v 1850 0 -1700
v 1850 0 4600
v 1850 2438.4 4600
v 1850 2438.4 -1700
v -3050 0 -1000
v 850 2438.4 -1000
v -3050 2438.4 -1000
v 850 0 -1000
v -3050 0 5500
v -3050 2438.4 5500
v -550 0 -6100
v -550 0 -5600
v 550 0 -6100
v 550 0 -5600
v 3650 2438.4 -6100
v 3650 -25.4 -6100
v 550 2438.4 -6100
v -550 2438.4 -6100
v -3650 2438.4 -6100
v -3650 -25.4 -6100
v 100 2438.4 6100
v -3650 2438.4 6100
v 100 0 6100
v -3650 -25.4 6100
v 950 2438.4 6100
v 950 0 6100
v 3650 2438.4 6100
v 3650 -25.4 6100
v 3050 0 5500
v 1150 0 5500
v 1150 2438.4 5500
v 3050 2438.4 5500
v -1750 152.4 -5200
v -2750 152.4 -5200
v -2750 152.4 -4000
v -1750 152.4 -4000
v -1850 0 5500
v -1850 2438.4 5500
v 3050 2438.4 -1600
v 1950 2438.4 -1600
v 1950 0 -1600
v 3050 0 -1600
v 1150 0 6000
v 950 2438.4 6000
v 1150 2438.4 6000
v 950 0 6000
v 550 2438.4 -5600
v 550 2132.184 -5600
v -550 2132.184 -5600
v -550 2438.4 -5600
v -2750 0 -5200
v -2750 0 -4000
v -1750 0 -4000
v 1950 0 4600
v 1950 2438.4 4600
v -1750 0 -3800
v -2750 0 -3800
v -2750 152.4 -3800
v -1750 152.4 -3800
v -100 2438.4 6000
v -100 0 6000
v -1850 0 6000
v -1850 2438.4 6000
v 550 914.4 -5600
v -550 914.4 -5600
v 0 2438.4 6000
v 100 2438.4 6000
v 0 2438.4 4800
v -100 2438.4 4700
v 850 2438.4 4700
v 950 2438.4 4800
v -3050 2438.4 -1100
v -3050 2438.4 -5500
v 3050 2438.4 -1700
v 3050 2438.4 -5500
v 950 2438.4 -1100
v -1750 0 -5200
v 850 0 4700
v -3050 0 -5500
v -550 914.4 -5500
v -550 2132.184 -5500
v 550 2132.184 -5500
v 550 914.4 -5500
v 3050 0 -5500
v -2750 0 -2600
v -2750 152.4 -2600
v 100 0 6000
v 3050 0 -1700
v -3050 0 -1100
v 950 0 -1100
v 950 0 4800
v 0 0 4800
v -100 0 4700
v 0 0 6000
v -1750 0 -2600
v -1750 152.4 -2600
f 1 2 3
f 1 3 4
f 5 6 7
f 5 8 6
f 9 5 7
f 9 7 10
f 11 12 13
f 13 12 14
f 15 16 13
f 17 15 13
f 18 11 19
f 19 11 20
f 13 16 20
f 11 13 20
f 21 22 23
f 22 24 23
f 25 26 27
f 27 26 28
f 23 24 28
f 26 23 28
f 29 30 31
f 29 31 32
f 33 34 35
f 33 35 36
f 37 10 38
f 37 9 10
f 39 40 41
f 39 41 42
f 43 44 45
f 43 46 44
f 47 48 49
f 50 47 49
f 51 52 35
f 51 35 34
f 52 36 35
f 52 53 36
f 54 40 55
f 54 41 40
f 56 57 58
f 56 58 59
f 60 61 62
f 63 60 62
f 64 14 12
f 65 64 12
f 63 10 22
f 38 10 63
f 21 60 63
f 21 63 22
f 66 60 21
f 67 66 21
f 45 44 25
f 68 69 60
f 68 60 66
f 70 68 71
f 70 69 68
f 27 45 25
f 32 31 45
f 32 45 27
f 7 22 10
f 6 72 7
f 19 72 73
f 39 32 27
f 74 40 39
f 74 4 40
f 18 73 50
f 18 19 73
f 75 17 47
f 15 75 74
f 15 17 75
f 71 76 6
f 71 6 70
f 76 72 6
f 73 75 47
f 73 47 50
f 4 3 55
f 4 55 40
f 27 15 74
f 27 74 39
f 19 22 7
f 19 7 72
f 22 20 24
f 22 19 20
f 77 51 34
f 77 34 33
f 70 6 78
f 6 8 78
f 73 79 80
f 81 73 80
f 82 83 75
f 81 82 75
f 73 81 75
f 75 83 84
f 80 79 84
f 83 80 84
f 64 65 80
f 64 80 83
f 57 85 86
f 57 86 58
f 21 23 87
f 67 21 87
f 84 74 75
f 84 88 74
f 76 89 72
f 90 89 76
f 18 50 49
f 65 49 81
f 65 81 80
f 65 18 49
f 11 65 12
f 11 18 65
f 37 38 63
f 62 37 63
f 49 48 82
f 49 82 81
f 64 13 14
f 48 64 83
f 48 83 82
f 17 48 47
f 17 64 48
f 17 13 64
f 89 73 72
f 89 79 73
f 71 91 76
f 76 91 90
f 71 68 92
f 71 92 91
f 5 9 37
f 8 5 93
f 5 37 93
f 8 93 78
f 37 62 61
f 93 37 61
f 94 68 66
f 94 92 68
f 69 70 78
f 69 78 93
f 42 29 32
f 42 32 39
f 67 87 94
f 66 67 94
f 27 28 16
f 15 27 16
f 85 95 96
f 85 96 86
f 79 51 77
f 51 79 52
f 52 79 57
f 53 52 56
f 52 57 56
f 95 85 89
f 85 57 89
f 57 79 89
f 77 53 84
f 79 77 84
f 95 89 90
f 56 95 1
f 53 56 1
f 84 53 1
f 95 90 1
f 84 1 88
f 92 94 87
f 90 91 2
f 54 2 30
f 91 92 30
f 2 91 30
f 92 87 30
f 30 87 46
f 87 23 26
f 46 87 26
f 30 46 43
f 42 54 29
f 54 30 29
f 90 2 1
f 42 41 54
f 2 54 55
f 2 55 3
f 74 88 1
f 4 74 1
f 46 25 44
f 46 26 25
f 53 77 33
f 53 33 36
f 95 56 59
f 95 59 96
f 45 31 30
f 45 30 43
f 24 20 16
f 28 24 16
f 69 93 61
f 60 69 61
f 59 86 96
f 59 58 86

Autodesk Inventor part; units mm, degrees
ref_plane "YZ Plane" through (0, 0, 0) normal (1, 0, 0) x (0, 1, 0)
ref_plane "XZ Plane" through (0, 0, 0) normal (0, 1, 0) x (-1, 0, 0)
ref_plane "XY Plane" through (0, 0, 0) normal (0, 0, 1) x (1, 0, 0)
sketch "Sketch1" plane through (0, 0, 0) normal (0, 1, 0) x (-1, 0, 0)
  line L0 (-3650, 6100) -> (-3650, -6100)
  line L1 (3650, -6100) -> (3650, 6100)
  line L2 (-3050, 5500) -> (-3050, -5500)
  line L3 (3050, -5500) -> (3050, 5500)
  line L4 (5110, 0) -> (-5110, 0) projected
  line L5 (0, -8540) -> (0, 8540) projected
  line L6 (-1150, 5500) -> (-1150, 6100)
  line L7 (1850, 5500) -> (1850, 6100)
  line L8 (550, -6100) -> (550, -5500)
  line L9 (-550, -6100) -> (-550, -5500)
  line L10 (-3650, -6100) -> (-550, -6100)
  line L11 (550, -6100) -> (3650, -6100)
  line L12 (-3050, -5500) -> (-550, -5500)
  line L13 (550, -5500) -> (3050, -5500)
  line L14 (3650, 6100) -> (1850, 6100)
  line L15 (-1150, 6100) -> (-3650, 6100)
  line L16 (3050, 5500) -> (1850, 5500)
  line L17 (-1150, 5500) -> (-3050, 5500)
  line L18 (3050, -1100) -> (-950, -1100)
  line L19 (-950, -1100) -> (-950, -1000)
  line L20 (-850, -1000) -> (3050, -1000)
  line L21 (3050, -1000) -> (3050, -1100)
  line L22 (1850, 6100) -> (-100, 6100)
  line L23 (-100, 6100) -> (-100, 6000)
  line L24 (1850, 6000) -> (1850, 6100)
  line L25 (0, 6000) -> (0, 4800)
  line L26 (100, 4700) -> (100, 6000)
  line L27 (-100, 6000) -> (0, 6000)
  line L28 (100, 6000) -> (1850, 6000)
  line L29 (-1150, 6100) -> (-950, 6100)
  line L30 (-950, 6100) -> (-950, 6000)
  line L31 (-950, 6000) -> (-1150, 6000)
  line L32 (-1150, 6000) -> (-1150, 6100)
  line L33 (0, 4800) -> (-950, 4800)
  line L34 (-950, 4800) -> (-950, 4700)
  line L35 (-850, 4700) -> (100, 4700)
  line L36 (100, 4700) -> (100, 4700)
  line L37 (-950, -1100) -> (-850, -1100)
  line L38 (-850, -1000) -> (-850, 4700)
  line L39 (-850, 4800) -> (-950, 4800)
  line L40 (-950, 4800) -> (-950, -1100)
  line L41 (-3050, -1700) -> (-1850, -1700)
  line L42 (-1850, -1700) -> (-1850, -1600)
  line L43 (-1950, -1600) -> (-3050, -1600)
  line L44 (-3050, -1600) -> (-3050, -1700)
  line L45 (-1850, -1700) -> (-1950, -1700)
  line L46 (-1950, -1600) -> (-1950, 4600)
  line L47 (-1950, 4600) -> (-1850, 4600)
  line L48 (-1850, 4600) -> (-1850, -1700)
  point P0 (0, 0)
  dimension "d0" = 7300
  dimension "d2" = 6100
  dimension "d5" = 1900
  dimension "d6" = 3000
  dimension "d7" = 2500
  dimension "d8" = 2500
  dimension "d9" = 12200
  dimension "d10" = 11000
  dimension "d11" = 100
  dimension "d12" = 4000
  dimension "d16" = 100
  dimension "d17" = 100
  dimension "d18" = 100
  dimension "d19" = 200
  dimension "d20" = 100
  dimension "d22" = 1200
  dimension "d23" = 6500
  dimension "d24" = 100
  dimension "d25" = 100
  dimension "d26" = 1200
  dimension "d27" = 3800
  dimension "d28" = 100
  dimension "d29" = 6300
extrude "Extrusion1" add sketch "Sketch1" along normal blind 2438.4 contours L15 L6 L17 L2 L4 L0 | L40 L34 L33 L5 L35 L38 L4 | L4 L38 L20 L5 L18 L19 L40 | L4 L2 L12 L9 L10 L0 | L29 L30 L31 L6 | L43 L46 L4 L48 L42 L41 L2 | L46 L47 L48 L4 | L4 L1 L11 L8 L13 L3 | L3 L16 L7 L14 L1 L4 | L20 L3 L18 L5 | L5 L22 L7 L28 L26 L35 | L27 L23 L22 L5
sketch "Sketch2" plane through (0, 0, 0) normal (0, -1, 0) x (1, 0, 0)
  line L0 (-100, 6000) -> (-1850, 6000) projected
  line L1 (-100, 4700) -> (-100, 6000) projected
  line L2 (850, 4700) -> (-100, 4700) projected
  line L3 (850, -1000) -> (850, 4700) projected
  line L4 (-3050, -1000) -> (850, -1000) projected
  line L5 (-3050, 5500) -> (-3050, -1000) projected
  line L6 (-1850, 5500) -> (-3050, 5500) projected
  line L7 (-1850, 6000) -> (-1850, 5500) projected
  line L8 (-3650, 6100) -> (100, 6100) projected
  line L9 (-3650, -6100) -> (-3650, 6100) projected
  line L10 (-550, -6100) -> (-3650, -6100) projected
  line L11 (-550, -5500) -> (-550, -6100) projected
  line L12 (-3050, -5500) -> (-550, -5500) projected
  line L13 (-3050, -1100) -> (-3050, -5500) projected
  line L14 (950, -1100) -> (-3050, -1100) projected
  line L15 (950, 4800) -> (950, -1100) projected
  line L16 (0, 4800) -> (950, 4800) projected
  line L17 (0, 6000) -> (0, 4800) projected
  line L18 (100, 6000) -> (0, 6000) projected
  line L19 (100, 6100) -> (100, 6000) projected
  line L20 (-3650, 6100) -> (3650, 6100)
  line L21 (3650, 6100) -> (3650, -6100)
  line L22 (3650, -6100) -> (-3650, -6100)
  line L23 (-3650, -6100) -> (-3650, 6100)
  point P0 (0, 0)
extrude "Extrusion2" add sketch "Sketch2" along normal blind 25.4 contours L1 L2 L3 L4 L5 L6 L7 L0 | L8 L19 L18 L17 L16 L15 L14 L13 L12 L11 L10 L9 | L20 L21 L22 L11 L12 L13 L14 L15 L16 L17 L18 L19
sketch "Sketch6" plane through (0, 0, 0) normal (0, 1, 0) x (1, 0, 0)
  line L0 (550, 6100) -> (550, 5500) projected
  line L1 (-550, 5500) -> (550, 5500)
  line L2 (550, 5500) -> (550, 5600)
  line L3 (550, 5600) -> (-550, 5600)
  line L4 (-550, 5600) -> (-550, 5500)
  point P0 (0, 0)
  dimension "d102" = 100
extrude "Extrusion6" add sketch "Sketch6" along normal up to surface (2438.4 mm away)
sketch "Sketch7" plane through (550, 0, -5600) normal (0, 0, -1) x (-1, 0, 0)
  line L0 (0, 0) -> (0, 2438.4) projected
  line L1 (1100, 0) -> (0, 0) projected
  line L2 (1100, 2438.4) -> (1100, 0) projected
  line L3 (0, 2132.1838) -> (1100, 2132.1838)
  line L4 (1100, 2132.1838) -> (1100, 914.4)
  line L5 (1100, 914.4) -> (0, 914.4)
  line L6 (0, 914.4) -> (0, 2132.1838)
  point P0 (550, 0)
  dimension "d111" = 914.4
extrude "Extrusion7" cut sketch "Sketch7" against normal up to surface (100 mm away) contours L0 L3 L2 L5
sketch "Sketch4" plane through (0, 0, 0) normal (0, 1, 0) x (1, 0, 0)
  line L0 (-3050, 5500) -> (-550, 5500) projected
  line L1 (-3050, 1100) -> (-3050, 5500) projected
  line L2 (-2750, 5200) -> (-1750, 5200)
  line L3 (-1750, 5200) -> (-1750, 4000)
  line L4 (-1750, 4000) -> (-2750, 4000)
  line L5 (-2750, 4000) -> (-2750, 5200)
  line L6 (-2750, 3800) -> (-1750, 3800)
  line L7 (-1750, 3800) -> (-1750, 2600)
  line L8 (-1750, 2600) -> (-2750, 2600)
  line L9 (-2750, 2600) -> (-2750, 3800)
  point P0 (0, 0)
  dimension "d79" = 1000
  dimension "d80" = 1200
  dimension "d81" = 1200
  dimension "d82" = 200
  dimension "d83" = 300
  dimension "d84" = 300
extrude "Pallets" add sketch "Sketch4" along normal blind 152.4
sketch "Sketch5" plane through (0, 0, 0) normal (0, 1, 0) x (1, 0, 0)
  line L0 (3050, 5500) -> (3050, 1700) projected
  line L1 (550, 5500) -> (3050, 5500) projected
  line L2 (-3050, 5500) -> (-550, 5500) projected
  line L3 (-3050, 1100) -> (-3050, 5500) projected
  line L4 (-2150, 5500) -> (-550, 5500)
  line L5 (-550, 5500) -> (-550, 4600)
  line L6 (-550, 4600) -> (-2150, 4600)
  line L7 (-2150, 4600) -> (-2150, 5500)
  line L8 (-3050, 4600) -> (-2150, 4600)
  line L9 (-2150, 4600) -> (-2150, 3000)
  line L10 (-2150, 3000) -> (-3050, 3000)
  line L11 (-3050, 3000) -> (-3050, 4600)
  line L12 (-350, 4400) -> (350, 4400)
  line L13 (350, 4400) -> (350, 3600)
  line L14 (350, 3600) -> (-350, 3600)
  line L15 (-350, 3600) -> (-350, 4400)
  line L16 (-2050, 3000) -> (-1250, 3000)
  line L17 (-1250, 3000) -> (-1250, 2300)
  line L18 (-1250, 2300) -> (-2050, 2300)
  line L19 (-2050, 2300) -> (-2050, 3000)
  point P0 (0, 0)
  dimension "d87" = 1600
  dimension "d88" = 900
  dimension "d89" = 900
  dimension "d90" = 1000
  dimension "d91" = 700
  dimension "d92" = 800
  dimension "d93" = 2700
  dimension "d94" = 1100
  dimension "d95" = 700
  dimension "d98" = 800
  dimension "d101" = 1600
sketch "Sketch3" plane through (0, 0, 0) normal (0, 1, 0) x (1, 0, 0)
  line L0 (1950, -4600) -> (1950, 1600) projected
  line L1 (3050, 1700) -> (1850, 1700) projected
  line L2 (3050, 5500) -> (3050, 1700) projected
  line L3 (550, 5500) -> (3050, 5500) projected
  line L4 (-550, 6100) -> (550, 6100) projected
  line L5 (-3050, 5500) -> (-550, 5500) projected
  line L6 (-3050, 1100) -> (-3050, 5500) projected
  line L7 (950, 1100) -> (-3050, 1100) projected
  line L8 (950, -4800) -> (950, 1100) projected
  line L9 (0, -4800) -> (950, -4800) projected
  circle A0 centre (-1050, 3400) radius 152.4
  circle A1 centre (1050, 3400) radius 152.4
  line L10 (-1050, 3247.6) -> (-745.2, 3247.6)
  line L11 (-745.2, 3247.6) -> (-745.2, 3552.4)
  line L12 (-745.2, 3552.4) -> (-1050, 3552.4)
  line L13 (-1050, 3552.4) -> (-1050, 3247.6)
  line L14 (-1050, 3247.6) -> (-745.2, 3552.4) construction
  line L15 (-745.2, 3247.6) -> (-1050, 3552.4) construction
  line L16 (745.2, 3247.6) -> (1050, 3247.6)
  line L17 (1050, 3247.6) -> (1050, 3552.4)
  line L18 (1050, 3552.4) -> (745.2, 3552.4)
  line L19 (745.2, 3552.4) -> (745.2, 3247.6)
  line L20 (745.2, 3247.6) -> (1050, 3552.4) construction
  line L21 (1050, 3247.6) -> (745.2, 3552.4) construction
  line L22 (0, 8570.48) -> (0, -8722.88) projected
  line L23 (2297.6, 2147.6) -> (2602.4, 2147.6)
  line L24 (2602.4, 2147.6) -> (2602.4, 2452.4)
  line L25 (2602.4, 2452.4) -> (2297.6, 2452.4)
  line L26 (2297.6, 2452.4) -> (2297.6, 2147.6)
  line L27 (2297.6, 2147.6) -> (2602.4, 2452.4) construction
  line L28 (2602.4, 2147.6) -> (2297.6, 2452.4) construction
  line L29 (1251.4208, -2447.6) -> (1556.2208, -2447.6)
  line L30 (1251.4208, -2142.8) -> (1251.4208, -2447.6)
  line L31 (1251.4208, -2447.6) -> (1556.2208, -2142.8) construction
  line L32 (1556.2208, -2447.6) -> (1251.4208, -2142.8) construction
  line L33 (1251.4208, -2752.4) -> (1556.2208, -2752.4)
  line L34 (1556.2208, -2752.4) -> (1556.2208, -2447.6)
  line L35 (1556.2208, -2447.6) -> (1251.4208, -2447.6)
  line L36 (1251.4208, -2447.6) -> (1251.4208, -2752.4)
  line L37 (1251.4208, -2752.4) -> (1556.2208, -2447.6) construction
  line L38 (1556.2208, -2752.4) -> (1251.4208, -2447.6) construction
  line L39 (1251.4208, -2142.8) -> (1556.2208, -2447.6)
  ellipse E0 centre (1403.8208, 246) end of major axis (1403.8208, 500) minor radius 152.4
  line L40 (1850, 1700) -> (1950, 1600)
  ellipse E1 centre (2029.6051, 1520.3949) end of major axis (2209.2102, 1340.7898) minor radius 152.4
  line L41 (1403.8208, 500) -> (1403.8208, -8)
  line L42 (-3050, 5500) -> (-2150, 5500) projected
  line L43 (-3050, 1100) -> (-3050, 3000) projected
  line L44 (950, 1100) -> (-3050, 1100) projected
  line L45 (950, -4800) -> (950, 1100) projected
  line L46 (0, -4800) -> (950, -4800) projected
  line L47 (0, -6000) -> (0, -4800) projected
  line L48 (100, -6000) -> (0, -6000) projected
  line L49 (100, -6100) -> (100, -6000) projected
  line L50 (950, -6100) -> (100, -6100) projected
  line L51 (950, -6000) -> (950, -6100) projected
  line L52 (1150, -6000) -> (950, -6000) projected
  line L53 (1150, -5500) -> (1150, -6000) projected
  line L54 (3050, -5500) -> (1150, -5500) projected
  line L55 (3050, 1600) -> (3050, -5500) projected
  line L56 (1950, 1600) -> (3050, 1600) projected
  line L57 (1950, -4600) -> (1950, 1600) projected
  line L58 (1850, -4600) -> (1950, -4600) projected
  line L59 (1850, 1700) -> (1850, -4600) projected
  line L60 (3050, 1700) -> (1850, 1700) projected
  line L61 (3050, 5500) -> (3050, 1700) projected
  line L62 (372.6, -6252.4) -> (677.4, -6252.4)
  line L63 (372.6, -5947.6) -> (372.6, -6252.4)
  line L64 (372.6, -6252.4) -> (601.2, -6023.8) construction
  line L65 (677.4, -6252.4) -> (372.6, -5947.6) construction
  line L66 (372.6, -5947.6) -> (677.4, -6252.4)
  line L67 (-550, 5500) -> (-550, 4600) projected
  line L68 (-550, 4600) -> (-1750, 4600) projected
  line L69 (-1750, 4600) -> (-1750, 4000) projected
  line L70 (-1750, 4000) -> (-2150, 4000) projected
  line L71 (-2150, 4000) -> (-2150, 3800) projected
  line L72 (-2150, 3800) -> (-1750, 3800) projected
  line L73 (-1750, 3800) -> (-1750, 3000) projected
  line L74 (-1750, 3000) -> (-1250, 3000) projected
  line L75 (-1250, 3000) -> (-1250, 2300) projected
  line L76 (-1250, 2300) -> (-2050, 2300) projected
  line L77 (-2050, 2300) -> (-2050, 2600) projected
  line L78 (-2050, 2600) -> (-2750, 2600) projected
  line L79 (-2750, 2600) -> (-2750, 3000) projected
  line L80 (-2750, 3000) -> (-3050, 3000) projected
  line L81 (-2150, 5200) -> (-2150, 5500) projected
  line L82 (-3050, 4600) -> (-2750, 4600) projected
  line L83 (-2750, 4600) -> (-2750, 5200) projected
  line L84 (-2750, 5200) -> (-2150, 5200) projected
  line L85 (-1850, -5500) -> (-3050, -5500) projected
  line L86 (-1850, -6000) -> (-1850, -5500) projected
  line L87 (-100, -6000) -> (-1850, -6000) projected
  line L88 (-100, -4700) -> (-100, -6000) projected
  line L89 (850, -4700) -> (-100, -4700) projected
  line L90 (850, 1000) -> (850, -4700) projected
  line L91 (-3050, 1000) -> (850, 1000) projected
  line L92 (-3050, -5500) -> (-3050, 1000) projected
  line L93 (152.4, 5347.6) -> (-152.4, 5347.6)
  line L94 (-152.4, 5347.6) -> (-152.4, 5652.4)
  line L95 (152.4, 5347.6) -> (-152.4, 5652.4) construction
  line L96 (-152.4, 5347.6) -> (152.4, 5652.4) construction
  line L97 (-152.4, 5652.4) -> (152.4, 5347.6)
  line L98 (-550, 5500) -> (3050, 5500) projected
  line L99 (-3050, 4600) -> (-3050, 5500) projected
  point P0 (0, 0)
  point P1 (-897.6, 3400)
  point P2 (897.6, 3400)
  point P3 (0, 6100)
  point P4 (2450, 2300)
  point P5 (1403.8208, -2295.2)
  point P6 (1403.8208, -2600)
  point P7 (525, -6100)
  point P8 (0, 5500)
  dimension "d73" = 152.4
  dimension "d74" = 254
  dimension "d75" = 254
  dimension "d76" = 152.4
  dimension "d34" = 2100
  dimension "d35" = 2000
  dimension "d36" = 2100
  dimension "d37" = 2000
  dimension "d38" = 304.8
  dimension "d39" = 304.8
  dimension "d40" = 2100
  dimension "d41" = 2100
  dimension "d43" = 304.8
  dimension "d44" = 304.8
  dimension "d45" = 304.8
  dimension "d51" = 600
  dimension "d52" = 600
  dimension "d53" = 304.8
  dimension "d54" = 304.8
  dimension "d56" = 2200
  dimension "d59" = 600
  dimension "d60" = 453.8208
  dimension "d61" = 453.8208
  dimension "d62" = 453.8208
  dimension "d63" = 304.8
  dimension "d65" = 304.8
  dimension "d66" = 304.8
  dimension "d107" = 304.8
  dimension "d108" = 304.8
  dimension "d109" = 45
  dimension "d110" = 152.4
  dimension "d116" = 304.8
  dimension "d117" = 304.8
  dimension "d118" = 152.4
properties part number "DelCo_2012_East_Structure"
